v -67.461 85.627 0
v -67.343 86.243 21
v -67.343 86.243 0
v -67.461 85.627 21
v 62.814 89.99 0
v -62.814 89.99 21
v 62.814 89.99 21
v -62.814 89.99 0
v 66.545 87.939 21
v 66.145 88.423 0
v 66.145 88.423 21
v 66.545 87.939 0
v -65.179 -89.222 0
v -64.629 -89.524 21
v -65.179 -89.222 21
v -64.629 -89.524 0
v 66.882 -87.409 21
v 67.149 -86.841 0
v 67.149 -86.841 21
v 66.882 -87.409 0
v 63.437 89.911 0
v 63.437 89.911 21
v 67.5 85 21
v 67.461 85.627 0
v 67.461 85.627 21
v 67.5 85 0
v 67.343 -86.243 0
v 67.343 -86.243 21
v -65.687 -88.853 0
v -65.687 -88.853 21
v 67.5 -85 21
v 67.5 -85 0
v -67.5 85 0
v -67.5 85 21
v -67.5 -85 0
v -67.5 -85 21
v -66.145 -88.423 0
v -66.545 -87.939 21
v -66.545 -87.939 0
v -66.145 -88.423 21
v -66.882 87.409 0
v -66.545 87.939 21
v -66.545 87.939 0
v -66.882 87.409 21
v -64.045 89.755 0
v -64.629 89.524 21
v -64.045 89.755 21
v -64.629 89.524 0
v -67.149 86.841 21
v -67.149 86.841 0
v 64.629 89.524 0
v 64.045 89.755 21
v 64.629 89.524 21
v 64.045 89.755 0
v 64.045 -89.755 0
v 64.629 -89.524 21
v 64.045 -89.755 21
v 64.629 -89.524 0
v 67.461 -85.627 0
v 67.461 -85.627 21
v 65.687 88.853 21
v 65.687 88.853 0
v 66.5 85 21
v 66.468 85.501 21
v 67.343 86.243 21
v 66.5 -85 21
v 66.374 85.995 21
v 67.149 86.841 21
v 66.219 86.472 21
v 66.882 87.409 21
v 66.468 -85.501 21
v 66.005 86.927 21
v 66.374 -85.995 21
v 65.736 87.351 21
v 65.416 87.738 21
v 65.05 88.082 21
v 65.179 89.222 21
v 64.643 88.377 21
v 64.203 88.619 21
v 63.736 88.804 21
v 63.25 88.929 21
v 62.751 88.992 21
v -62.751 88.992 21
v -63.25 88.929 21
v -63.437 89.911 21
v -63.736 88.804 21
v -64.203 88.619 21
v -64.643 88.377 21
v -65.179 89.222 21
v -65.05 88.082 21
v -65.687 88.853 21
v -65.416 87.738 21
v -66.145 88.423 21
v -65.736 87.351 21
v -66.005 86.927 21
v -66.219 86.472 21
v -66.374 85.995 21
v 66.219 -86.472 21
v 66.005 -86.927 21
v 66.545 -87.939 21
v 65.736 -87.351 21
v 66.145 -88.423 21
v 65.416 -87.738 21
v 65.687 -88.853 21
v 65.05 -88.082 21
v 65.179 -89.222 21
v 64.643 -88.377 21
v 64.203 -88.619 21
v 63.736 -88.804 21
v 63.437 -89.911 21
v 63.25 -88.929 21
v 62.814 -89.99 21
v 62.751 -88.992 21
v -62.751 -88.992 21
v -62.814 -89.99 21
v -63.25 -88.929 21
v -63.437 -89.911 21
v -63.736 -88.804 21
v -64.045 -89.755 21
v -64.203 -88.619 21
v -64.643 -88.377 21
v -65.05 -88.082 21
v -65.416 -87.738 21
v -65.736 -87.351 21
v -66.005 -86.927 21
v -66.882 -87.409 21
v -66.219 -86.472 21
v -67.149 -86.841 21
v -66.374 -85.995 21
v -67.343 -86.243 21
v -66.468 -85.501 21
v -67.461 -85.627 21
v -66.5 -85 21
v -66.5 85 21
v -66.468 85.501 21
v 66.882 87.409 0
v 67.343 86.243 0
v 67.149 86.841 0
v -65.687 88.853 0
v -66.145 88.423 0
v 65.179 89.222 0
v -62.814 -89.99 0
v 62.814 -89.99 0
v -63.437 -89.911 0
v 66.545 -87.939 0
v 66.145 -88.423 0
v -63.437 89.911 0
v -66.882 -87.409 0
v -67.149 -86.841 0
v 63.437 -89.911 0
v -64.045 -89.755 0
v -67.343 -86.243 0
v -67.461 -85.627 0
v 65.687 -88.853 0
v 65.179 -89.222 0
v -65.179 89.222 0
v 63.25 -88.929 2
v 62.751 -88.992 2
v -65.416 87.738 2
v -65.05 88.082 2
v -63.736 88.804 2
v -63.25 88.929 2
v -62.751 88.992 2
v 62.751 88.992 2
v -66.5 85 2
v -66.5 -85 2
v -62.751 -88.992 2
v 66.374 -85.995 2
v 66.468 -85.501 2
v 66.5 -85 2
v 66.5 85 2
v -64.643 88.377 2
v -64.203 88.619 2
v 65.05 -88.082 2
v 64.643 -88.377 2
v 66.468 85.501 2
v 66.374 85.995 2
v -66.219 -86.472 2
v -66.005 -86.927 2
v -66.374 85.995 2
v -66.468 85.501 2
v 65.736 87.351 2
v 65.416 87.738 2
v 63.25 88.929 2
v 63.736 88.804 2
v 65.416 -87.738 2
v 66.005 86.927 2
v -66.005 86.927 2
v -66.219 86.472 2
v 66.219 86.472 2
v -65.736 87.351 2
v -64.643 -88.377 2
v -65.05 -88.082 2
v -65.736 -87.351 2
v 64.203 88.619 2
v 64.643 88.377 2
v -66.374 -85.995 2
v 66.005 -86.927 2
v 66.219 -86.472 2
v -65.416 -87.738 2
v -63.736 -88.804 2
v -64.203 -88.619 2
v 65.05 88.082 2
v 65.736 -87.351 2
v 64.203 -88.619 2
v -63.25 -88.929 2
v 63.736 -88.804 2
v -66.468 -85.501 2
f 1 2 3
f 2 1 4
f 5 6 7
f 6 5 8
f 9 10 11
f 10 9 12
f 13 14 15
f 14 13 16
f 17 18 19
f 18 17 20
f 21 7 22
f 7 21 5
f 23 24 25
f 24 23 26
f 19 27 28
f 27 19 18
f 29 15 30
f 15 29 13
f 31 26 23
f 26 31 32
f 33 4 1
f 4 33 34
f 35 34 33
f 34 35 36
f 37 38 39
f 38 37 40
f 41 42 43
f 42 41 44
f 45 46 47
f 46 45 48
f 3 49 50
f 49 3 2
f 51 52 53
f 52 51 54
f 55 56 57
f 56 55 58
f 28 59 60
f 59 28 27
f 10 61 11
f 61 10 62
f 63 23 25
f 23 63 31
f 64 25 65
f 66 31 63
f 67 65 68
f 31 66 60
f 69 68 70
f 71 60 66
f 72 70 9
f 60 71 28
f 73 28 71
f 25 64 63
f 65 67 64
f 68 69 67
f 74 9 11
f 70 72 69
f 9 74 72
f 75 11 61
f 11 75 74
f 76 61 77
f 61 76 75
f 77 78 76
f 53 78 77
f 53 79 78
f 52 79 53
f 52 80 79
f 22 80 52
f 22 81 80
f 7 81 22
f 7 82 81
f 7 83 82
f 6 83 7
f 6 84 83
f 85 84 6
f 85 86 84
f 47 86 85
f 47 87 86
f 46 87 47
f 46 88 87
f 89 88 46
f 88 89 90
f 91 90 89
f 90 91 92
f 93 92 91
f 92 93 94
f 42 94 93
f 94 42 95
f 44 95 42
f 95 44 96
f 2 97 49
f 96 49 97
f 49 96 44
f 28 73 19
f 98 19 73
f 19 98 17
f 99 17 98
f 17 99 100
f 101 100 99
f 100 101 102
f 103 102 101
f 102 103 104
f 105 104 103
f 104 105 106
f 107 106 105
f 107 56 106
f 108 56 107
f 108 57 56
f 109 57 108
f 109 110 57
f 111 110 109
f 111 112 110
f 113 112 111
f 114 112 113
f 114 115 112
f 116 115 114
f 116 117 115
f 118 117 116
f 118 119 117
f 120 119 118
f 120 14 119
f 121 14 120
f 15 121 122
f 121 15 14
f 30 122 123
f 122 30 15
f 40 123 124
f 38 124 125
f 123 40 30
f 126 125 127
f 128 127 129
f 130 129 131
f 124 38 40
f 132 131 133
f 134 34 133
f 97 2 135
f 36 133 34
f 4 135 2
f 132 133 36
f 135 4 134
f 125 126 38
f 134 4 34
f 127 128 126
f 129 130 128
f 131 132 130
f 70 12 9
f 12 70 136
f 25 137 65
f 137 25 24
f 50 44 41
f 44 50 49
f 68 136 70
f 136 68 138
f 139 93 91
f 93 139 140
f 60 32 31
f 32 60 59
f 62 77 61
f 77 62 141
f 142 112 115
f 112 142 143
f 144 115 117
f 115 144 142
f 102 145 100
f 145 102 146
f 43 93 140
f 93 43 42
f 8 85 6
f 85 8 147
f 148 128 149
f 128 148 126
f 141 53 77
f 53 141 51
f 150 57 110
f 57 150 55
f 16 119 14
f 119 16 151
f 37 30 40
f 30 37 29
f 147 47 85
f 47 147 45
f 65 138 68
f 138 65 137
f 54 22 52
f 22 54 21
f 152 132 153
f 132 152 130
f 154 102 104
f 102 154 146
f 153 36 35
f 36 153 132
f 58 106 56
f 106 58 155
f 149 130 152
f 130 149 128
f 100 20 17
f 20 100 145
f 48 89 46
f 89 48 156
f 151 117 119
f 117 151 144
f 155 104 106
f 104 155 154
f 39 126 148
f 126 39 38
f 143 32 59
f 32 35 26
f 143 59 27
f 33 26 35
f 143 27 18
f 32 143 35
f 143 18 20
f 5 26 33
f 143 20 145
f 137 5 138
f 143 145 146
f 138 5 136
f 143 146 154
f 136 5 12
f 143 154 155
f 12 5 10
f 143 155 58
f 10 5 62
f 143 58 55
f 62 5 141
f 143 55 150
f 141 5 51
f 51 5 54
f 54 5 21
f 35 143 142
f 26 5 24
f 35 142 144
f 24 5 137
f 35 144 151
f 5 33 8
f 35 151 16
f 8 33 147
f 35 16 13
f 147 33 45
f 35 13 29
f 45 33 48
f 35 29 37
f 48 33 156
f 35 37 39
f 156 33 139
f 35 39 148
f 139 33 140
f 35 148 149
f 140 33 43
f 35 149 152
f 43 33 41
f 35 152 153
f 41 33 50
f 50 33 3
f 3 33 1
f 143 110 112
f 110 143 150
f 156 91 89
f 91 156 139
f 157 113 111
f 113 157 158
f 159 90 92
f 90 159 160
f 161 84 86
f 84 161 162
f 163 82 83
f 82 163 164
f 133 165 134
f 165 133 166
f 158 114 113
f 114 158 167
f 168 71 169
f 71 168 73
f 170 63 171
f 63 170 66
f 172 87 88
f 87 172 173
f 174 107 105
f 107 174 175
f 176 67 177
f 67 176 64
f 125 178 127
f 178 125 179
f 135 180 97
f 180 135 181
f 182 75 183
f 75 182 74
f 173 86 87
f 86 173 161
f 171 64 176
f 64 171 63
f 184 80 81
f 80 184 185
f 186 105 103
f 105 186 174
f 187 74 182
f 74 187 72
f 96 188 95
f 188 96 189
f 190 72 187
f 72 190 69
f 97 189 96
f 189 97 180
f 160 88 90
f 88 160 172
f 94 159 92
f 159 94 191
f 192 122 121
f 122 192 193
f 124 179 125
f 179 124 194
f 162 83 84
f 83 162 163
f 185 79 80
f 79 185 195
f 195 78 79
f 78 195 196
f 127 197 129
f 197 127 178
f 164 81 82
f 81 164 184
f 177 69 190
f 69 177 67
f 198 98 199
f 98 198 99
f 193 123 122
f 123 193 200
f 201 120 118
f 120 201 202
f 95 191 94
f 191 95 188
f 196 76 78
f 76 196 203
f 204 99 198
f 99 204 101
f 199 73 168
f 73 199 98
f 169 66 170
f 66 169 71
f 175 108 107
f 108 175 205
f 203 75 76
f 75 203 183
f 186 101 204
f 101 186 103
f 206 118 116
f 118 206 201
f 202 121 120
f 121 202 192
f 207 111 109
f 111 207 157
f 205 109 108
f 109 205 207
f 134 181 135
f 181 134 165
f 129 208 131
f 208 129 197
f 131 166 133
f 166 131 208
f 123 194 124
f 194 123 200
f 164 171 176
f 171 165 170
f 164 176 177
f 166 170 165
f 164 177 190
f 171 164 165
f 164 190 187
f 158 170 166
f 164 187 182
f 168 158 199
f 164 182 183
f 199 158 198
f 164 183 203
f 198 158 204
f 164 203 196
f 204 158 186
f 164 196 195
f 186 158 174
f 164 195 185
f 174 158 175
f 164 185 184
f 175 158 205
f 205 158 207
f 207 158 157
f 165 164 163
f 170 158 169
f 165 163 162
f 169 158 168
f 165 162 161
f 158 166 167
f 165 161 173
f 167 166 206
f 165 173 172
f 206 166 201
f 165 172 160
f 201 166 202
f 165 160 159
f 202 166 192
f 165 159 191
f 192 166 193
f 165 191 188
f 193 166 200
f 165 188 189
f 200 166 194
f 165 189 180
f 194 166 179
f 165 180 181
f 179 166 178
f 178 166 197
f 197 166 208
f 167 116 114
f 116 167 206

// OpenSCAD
$fn = 50;


difference() {
	union() {
		hull() {
			translate(v = [-62.5000000000, 85.0000000000, 0]) {
				cylinder(h = 21, r = 5);
			}
			translate(v = [62.5000000000, 85.0000000000, 0]) {
				cylinder(h = 21, r = 5);
			}
			translate(v = [-62.5000000000, -85.0000000000, 0]) {
				cylinder(h = 21, r = 5);
			}
			translate(v = [62.5000000000, -85.0000000000, 0]) {
				cylinder(h = 21, r = 5);
			}
		}
	}
	union() {
		translate(v = [0, 0, 2]) {
			hull() {
				translate(v = [-62.5000000000, 85.0000000000, 0]) {
					cylinder(h = 19, r = 4);
				}
				translate(v = [62.5000000000, 85.0000000000, 0]) {
					cylinder(h = 19, r = 4);
				}
				translate(v = [-62.5000000000, -85.0000000000, 0]) {
					cylinder(h = 19, r = 4);
				}
				translate(v = [62.5000000000, -85.0000000000, 0]) {
					cylinder(h = 19, r = 4);
				}
			}
		}
	}
}
